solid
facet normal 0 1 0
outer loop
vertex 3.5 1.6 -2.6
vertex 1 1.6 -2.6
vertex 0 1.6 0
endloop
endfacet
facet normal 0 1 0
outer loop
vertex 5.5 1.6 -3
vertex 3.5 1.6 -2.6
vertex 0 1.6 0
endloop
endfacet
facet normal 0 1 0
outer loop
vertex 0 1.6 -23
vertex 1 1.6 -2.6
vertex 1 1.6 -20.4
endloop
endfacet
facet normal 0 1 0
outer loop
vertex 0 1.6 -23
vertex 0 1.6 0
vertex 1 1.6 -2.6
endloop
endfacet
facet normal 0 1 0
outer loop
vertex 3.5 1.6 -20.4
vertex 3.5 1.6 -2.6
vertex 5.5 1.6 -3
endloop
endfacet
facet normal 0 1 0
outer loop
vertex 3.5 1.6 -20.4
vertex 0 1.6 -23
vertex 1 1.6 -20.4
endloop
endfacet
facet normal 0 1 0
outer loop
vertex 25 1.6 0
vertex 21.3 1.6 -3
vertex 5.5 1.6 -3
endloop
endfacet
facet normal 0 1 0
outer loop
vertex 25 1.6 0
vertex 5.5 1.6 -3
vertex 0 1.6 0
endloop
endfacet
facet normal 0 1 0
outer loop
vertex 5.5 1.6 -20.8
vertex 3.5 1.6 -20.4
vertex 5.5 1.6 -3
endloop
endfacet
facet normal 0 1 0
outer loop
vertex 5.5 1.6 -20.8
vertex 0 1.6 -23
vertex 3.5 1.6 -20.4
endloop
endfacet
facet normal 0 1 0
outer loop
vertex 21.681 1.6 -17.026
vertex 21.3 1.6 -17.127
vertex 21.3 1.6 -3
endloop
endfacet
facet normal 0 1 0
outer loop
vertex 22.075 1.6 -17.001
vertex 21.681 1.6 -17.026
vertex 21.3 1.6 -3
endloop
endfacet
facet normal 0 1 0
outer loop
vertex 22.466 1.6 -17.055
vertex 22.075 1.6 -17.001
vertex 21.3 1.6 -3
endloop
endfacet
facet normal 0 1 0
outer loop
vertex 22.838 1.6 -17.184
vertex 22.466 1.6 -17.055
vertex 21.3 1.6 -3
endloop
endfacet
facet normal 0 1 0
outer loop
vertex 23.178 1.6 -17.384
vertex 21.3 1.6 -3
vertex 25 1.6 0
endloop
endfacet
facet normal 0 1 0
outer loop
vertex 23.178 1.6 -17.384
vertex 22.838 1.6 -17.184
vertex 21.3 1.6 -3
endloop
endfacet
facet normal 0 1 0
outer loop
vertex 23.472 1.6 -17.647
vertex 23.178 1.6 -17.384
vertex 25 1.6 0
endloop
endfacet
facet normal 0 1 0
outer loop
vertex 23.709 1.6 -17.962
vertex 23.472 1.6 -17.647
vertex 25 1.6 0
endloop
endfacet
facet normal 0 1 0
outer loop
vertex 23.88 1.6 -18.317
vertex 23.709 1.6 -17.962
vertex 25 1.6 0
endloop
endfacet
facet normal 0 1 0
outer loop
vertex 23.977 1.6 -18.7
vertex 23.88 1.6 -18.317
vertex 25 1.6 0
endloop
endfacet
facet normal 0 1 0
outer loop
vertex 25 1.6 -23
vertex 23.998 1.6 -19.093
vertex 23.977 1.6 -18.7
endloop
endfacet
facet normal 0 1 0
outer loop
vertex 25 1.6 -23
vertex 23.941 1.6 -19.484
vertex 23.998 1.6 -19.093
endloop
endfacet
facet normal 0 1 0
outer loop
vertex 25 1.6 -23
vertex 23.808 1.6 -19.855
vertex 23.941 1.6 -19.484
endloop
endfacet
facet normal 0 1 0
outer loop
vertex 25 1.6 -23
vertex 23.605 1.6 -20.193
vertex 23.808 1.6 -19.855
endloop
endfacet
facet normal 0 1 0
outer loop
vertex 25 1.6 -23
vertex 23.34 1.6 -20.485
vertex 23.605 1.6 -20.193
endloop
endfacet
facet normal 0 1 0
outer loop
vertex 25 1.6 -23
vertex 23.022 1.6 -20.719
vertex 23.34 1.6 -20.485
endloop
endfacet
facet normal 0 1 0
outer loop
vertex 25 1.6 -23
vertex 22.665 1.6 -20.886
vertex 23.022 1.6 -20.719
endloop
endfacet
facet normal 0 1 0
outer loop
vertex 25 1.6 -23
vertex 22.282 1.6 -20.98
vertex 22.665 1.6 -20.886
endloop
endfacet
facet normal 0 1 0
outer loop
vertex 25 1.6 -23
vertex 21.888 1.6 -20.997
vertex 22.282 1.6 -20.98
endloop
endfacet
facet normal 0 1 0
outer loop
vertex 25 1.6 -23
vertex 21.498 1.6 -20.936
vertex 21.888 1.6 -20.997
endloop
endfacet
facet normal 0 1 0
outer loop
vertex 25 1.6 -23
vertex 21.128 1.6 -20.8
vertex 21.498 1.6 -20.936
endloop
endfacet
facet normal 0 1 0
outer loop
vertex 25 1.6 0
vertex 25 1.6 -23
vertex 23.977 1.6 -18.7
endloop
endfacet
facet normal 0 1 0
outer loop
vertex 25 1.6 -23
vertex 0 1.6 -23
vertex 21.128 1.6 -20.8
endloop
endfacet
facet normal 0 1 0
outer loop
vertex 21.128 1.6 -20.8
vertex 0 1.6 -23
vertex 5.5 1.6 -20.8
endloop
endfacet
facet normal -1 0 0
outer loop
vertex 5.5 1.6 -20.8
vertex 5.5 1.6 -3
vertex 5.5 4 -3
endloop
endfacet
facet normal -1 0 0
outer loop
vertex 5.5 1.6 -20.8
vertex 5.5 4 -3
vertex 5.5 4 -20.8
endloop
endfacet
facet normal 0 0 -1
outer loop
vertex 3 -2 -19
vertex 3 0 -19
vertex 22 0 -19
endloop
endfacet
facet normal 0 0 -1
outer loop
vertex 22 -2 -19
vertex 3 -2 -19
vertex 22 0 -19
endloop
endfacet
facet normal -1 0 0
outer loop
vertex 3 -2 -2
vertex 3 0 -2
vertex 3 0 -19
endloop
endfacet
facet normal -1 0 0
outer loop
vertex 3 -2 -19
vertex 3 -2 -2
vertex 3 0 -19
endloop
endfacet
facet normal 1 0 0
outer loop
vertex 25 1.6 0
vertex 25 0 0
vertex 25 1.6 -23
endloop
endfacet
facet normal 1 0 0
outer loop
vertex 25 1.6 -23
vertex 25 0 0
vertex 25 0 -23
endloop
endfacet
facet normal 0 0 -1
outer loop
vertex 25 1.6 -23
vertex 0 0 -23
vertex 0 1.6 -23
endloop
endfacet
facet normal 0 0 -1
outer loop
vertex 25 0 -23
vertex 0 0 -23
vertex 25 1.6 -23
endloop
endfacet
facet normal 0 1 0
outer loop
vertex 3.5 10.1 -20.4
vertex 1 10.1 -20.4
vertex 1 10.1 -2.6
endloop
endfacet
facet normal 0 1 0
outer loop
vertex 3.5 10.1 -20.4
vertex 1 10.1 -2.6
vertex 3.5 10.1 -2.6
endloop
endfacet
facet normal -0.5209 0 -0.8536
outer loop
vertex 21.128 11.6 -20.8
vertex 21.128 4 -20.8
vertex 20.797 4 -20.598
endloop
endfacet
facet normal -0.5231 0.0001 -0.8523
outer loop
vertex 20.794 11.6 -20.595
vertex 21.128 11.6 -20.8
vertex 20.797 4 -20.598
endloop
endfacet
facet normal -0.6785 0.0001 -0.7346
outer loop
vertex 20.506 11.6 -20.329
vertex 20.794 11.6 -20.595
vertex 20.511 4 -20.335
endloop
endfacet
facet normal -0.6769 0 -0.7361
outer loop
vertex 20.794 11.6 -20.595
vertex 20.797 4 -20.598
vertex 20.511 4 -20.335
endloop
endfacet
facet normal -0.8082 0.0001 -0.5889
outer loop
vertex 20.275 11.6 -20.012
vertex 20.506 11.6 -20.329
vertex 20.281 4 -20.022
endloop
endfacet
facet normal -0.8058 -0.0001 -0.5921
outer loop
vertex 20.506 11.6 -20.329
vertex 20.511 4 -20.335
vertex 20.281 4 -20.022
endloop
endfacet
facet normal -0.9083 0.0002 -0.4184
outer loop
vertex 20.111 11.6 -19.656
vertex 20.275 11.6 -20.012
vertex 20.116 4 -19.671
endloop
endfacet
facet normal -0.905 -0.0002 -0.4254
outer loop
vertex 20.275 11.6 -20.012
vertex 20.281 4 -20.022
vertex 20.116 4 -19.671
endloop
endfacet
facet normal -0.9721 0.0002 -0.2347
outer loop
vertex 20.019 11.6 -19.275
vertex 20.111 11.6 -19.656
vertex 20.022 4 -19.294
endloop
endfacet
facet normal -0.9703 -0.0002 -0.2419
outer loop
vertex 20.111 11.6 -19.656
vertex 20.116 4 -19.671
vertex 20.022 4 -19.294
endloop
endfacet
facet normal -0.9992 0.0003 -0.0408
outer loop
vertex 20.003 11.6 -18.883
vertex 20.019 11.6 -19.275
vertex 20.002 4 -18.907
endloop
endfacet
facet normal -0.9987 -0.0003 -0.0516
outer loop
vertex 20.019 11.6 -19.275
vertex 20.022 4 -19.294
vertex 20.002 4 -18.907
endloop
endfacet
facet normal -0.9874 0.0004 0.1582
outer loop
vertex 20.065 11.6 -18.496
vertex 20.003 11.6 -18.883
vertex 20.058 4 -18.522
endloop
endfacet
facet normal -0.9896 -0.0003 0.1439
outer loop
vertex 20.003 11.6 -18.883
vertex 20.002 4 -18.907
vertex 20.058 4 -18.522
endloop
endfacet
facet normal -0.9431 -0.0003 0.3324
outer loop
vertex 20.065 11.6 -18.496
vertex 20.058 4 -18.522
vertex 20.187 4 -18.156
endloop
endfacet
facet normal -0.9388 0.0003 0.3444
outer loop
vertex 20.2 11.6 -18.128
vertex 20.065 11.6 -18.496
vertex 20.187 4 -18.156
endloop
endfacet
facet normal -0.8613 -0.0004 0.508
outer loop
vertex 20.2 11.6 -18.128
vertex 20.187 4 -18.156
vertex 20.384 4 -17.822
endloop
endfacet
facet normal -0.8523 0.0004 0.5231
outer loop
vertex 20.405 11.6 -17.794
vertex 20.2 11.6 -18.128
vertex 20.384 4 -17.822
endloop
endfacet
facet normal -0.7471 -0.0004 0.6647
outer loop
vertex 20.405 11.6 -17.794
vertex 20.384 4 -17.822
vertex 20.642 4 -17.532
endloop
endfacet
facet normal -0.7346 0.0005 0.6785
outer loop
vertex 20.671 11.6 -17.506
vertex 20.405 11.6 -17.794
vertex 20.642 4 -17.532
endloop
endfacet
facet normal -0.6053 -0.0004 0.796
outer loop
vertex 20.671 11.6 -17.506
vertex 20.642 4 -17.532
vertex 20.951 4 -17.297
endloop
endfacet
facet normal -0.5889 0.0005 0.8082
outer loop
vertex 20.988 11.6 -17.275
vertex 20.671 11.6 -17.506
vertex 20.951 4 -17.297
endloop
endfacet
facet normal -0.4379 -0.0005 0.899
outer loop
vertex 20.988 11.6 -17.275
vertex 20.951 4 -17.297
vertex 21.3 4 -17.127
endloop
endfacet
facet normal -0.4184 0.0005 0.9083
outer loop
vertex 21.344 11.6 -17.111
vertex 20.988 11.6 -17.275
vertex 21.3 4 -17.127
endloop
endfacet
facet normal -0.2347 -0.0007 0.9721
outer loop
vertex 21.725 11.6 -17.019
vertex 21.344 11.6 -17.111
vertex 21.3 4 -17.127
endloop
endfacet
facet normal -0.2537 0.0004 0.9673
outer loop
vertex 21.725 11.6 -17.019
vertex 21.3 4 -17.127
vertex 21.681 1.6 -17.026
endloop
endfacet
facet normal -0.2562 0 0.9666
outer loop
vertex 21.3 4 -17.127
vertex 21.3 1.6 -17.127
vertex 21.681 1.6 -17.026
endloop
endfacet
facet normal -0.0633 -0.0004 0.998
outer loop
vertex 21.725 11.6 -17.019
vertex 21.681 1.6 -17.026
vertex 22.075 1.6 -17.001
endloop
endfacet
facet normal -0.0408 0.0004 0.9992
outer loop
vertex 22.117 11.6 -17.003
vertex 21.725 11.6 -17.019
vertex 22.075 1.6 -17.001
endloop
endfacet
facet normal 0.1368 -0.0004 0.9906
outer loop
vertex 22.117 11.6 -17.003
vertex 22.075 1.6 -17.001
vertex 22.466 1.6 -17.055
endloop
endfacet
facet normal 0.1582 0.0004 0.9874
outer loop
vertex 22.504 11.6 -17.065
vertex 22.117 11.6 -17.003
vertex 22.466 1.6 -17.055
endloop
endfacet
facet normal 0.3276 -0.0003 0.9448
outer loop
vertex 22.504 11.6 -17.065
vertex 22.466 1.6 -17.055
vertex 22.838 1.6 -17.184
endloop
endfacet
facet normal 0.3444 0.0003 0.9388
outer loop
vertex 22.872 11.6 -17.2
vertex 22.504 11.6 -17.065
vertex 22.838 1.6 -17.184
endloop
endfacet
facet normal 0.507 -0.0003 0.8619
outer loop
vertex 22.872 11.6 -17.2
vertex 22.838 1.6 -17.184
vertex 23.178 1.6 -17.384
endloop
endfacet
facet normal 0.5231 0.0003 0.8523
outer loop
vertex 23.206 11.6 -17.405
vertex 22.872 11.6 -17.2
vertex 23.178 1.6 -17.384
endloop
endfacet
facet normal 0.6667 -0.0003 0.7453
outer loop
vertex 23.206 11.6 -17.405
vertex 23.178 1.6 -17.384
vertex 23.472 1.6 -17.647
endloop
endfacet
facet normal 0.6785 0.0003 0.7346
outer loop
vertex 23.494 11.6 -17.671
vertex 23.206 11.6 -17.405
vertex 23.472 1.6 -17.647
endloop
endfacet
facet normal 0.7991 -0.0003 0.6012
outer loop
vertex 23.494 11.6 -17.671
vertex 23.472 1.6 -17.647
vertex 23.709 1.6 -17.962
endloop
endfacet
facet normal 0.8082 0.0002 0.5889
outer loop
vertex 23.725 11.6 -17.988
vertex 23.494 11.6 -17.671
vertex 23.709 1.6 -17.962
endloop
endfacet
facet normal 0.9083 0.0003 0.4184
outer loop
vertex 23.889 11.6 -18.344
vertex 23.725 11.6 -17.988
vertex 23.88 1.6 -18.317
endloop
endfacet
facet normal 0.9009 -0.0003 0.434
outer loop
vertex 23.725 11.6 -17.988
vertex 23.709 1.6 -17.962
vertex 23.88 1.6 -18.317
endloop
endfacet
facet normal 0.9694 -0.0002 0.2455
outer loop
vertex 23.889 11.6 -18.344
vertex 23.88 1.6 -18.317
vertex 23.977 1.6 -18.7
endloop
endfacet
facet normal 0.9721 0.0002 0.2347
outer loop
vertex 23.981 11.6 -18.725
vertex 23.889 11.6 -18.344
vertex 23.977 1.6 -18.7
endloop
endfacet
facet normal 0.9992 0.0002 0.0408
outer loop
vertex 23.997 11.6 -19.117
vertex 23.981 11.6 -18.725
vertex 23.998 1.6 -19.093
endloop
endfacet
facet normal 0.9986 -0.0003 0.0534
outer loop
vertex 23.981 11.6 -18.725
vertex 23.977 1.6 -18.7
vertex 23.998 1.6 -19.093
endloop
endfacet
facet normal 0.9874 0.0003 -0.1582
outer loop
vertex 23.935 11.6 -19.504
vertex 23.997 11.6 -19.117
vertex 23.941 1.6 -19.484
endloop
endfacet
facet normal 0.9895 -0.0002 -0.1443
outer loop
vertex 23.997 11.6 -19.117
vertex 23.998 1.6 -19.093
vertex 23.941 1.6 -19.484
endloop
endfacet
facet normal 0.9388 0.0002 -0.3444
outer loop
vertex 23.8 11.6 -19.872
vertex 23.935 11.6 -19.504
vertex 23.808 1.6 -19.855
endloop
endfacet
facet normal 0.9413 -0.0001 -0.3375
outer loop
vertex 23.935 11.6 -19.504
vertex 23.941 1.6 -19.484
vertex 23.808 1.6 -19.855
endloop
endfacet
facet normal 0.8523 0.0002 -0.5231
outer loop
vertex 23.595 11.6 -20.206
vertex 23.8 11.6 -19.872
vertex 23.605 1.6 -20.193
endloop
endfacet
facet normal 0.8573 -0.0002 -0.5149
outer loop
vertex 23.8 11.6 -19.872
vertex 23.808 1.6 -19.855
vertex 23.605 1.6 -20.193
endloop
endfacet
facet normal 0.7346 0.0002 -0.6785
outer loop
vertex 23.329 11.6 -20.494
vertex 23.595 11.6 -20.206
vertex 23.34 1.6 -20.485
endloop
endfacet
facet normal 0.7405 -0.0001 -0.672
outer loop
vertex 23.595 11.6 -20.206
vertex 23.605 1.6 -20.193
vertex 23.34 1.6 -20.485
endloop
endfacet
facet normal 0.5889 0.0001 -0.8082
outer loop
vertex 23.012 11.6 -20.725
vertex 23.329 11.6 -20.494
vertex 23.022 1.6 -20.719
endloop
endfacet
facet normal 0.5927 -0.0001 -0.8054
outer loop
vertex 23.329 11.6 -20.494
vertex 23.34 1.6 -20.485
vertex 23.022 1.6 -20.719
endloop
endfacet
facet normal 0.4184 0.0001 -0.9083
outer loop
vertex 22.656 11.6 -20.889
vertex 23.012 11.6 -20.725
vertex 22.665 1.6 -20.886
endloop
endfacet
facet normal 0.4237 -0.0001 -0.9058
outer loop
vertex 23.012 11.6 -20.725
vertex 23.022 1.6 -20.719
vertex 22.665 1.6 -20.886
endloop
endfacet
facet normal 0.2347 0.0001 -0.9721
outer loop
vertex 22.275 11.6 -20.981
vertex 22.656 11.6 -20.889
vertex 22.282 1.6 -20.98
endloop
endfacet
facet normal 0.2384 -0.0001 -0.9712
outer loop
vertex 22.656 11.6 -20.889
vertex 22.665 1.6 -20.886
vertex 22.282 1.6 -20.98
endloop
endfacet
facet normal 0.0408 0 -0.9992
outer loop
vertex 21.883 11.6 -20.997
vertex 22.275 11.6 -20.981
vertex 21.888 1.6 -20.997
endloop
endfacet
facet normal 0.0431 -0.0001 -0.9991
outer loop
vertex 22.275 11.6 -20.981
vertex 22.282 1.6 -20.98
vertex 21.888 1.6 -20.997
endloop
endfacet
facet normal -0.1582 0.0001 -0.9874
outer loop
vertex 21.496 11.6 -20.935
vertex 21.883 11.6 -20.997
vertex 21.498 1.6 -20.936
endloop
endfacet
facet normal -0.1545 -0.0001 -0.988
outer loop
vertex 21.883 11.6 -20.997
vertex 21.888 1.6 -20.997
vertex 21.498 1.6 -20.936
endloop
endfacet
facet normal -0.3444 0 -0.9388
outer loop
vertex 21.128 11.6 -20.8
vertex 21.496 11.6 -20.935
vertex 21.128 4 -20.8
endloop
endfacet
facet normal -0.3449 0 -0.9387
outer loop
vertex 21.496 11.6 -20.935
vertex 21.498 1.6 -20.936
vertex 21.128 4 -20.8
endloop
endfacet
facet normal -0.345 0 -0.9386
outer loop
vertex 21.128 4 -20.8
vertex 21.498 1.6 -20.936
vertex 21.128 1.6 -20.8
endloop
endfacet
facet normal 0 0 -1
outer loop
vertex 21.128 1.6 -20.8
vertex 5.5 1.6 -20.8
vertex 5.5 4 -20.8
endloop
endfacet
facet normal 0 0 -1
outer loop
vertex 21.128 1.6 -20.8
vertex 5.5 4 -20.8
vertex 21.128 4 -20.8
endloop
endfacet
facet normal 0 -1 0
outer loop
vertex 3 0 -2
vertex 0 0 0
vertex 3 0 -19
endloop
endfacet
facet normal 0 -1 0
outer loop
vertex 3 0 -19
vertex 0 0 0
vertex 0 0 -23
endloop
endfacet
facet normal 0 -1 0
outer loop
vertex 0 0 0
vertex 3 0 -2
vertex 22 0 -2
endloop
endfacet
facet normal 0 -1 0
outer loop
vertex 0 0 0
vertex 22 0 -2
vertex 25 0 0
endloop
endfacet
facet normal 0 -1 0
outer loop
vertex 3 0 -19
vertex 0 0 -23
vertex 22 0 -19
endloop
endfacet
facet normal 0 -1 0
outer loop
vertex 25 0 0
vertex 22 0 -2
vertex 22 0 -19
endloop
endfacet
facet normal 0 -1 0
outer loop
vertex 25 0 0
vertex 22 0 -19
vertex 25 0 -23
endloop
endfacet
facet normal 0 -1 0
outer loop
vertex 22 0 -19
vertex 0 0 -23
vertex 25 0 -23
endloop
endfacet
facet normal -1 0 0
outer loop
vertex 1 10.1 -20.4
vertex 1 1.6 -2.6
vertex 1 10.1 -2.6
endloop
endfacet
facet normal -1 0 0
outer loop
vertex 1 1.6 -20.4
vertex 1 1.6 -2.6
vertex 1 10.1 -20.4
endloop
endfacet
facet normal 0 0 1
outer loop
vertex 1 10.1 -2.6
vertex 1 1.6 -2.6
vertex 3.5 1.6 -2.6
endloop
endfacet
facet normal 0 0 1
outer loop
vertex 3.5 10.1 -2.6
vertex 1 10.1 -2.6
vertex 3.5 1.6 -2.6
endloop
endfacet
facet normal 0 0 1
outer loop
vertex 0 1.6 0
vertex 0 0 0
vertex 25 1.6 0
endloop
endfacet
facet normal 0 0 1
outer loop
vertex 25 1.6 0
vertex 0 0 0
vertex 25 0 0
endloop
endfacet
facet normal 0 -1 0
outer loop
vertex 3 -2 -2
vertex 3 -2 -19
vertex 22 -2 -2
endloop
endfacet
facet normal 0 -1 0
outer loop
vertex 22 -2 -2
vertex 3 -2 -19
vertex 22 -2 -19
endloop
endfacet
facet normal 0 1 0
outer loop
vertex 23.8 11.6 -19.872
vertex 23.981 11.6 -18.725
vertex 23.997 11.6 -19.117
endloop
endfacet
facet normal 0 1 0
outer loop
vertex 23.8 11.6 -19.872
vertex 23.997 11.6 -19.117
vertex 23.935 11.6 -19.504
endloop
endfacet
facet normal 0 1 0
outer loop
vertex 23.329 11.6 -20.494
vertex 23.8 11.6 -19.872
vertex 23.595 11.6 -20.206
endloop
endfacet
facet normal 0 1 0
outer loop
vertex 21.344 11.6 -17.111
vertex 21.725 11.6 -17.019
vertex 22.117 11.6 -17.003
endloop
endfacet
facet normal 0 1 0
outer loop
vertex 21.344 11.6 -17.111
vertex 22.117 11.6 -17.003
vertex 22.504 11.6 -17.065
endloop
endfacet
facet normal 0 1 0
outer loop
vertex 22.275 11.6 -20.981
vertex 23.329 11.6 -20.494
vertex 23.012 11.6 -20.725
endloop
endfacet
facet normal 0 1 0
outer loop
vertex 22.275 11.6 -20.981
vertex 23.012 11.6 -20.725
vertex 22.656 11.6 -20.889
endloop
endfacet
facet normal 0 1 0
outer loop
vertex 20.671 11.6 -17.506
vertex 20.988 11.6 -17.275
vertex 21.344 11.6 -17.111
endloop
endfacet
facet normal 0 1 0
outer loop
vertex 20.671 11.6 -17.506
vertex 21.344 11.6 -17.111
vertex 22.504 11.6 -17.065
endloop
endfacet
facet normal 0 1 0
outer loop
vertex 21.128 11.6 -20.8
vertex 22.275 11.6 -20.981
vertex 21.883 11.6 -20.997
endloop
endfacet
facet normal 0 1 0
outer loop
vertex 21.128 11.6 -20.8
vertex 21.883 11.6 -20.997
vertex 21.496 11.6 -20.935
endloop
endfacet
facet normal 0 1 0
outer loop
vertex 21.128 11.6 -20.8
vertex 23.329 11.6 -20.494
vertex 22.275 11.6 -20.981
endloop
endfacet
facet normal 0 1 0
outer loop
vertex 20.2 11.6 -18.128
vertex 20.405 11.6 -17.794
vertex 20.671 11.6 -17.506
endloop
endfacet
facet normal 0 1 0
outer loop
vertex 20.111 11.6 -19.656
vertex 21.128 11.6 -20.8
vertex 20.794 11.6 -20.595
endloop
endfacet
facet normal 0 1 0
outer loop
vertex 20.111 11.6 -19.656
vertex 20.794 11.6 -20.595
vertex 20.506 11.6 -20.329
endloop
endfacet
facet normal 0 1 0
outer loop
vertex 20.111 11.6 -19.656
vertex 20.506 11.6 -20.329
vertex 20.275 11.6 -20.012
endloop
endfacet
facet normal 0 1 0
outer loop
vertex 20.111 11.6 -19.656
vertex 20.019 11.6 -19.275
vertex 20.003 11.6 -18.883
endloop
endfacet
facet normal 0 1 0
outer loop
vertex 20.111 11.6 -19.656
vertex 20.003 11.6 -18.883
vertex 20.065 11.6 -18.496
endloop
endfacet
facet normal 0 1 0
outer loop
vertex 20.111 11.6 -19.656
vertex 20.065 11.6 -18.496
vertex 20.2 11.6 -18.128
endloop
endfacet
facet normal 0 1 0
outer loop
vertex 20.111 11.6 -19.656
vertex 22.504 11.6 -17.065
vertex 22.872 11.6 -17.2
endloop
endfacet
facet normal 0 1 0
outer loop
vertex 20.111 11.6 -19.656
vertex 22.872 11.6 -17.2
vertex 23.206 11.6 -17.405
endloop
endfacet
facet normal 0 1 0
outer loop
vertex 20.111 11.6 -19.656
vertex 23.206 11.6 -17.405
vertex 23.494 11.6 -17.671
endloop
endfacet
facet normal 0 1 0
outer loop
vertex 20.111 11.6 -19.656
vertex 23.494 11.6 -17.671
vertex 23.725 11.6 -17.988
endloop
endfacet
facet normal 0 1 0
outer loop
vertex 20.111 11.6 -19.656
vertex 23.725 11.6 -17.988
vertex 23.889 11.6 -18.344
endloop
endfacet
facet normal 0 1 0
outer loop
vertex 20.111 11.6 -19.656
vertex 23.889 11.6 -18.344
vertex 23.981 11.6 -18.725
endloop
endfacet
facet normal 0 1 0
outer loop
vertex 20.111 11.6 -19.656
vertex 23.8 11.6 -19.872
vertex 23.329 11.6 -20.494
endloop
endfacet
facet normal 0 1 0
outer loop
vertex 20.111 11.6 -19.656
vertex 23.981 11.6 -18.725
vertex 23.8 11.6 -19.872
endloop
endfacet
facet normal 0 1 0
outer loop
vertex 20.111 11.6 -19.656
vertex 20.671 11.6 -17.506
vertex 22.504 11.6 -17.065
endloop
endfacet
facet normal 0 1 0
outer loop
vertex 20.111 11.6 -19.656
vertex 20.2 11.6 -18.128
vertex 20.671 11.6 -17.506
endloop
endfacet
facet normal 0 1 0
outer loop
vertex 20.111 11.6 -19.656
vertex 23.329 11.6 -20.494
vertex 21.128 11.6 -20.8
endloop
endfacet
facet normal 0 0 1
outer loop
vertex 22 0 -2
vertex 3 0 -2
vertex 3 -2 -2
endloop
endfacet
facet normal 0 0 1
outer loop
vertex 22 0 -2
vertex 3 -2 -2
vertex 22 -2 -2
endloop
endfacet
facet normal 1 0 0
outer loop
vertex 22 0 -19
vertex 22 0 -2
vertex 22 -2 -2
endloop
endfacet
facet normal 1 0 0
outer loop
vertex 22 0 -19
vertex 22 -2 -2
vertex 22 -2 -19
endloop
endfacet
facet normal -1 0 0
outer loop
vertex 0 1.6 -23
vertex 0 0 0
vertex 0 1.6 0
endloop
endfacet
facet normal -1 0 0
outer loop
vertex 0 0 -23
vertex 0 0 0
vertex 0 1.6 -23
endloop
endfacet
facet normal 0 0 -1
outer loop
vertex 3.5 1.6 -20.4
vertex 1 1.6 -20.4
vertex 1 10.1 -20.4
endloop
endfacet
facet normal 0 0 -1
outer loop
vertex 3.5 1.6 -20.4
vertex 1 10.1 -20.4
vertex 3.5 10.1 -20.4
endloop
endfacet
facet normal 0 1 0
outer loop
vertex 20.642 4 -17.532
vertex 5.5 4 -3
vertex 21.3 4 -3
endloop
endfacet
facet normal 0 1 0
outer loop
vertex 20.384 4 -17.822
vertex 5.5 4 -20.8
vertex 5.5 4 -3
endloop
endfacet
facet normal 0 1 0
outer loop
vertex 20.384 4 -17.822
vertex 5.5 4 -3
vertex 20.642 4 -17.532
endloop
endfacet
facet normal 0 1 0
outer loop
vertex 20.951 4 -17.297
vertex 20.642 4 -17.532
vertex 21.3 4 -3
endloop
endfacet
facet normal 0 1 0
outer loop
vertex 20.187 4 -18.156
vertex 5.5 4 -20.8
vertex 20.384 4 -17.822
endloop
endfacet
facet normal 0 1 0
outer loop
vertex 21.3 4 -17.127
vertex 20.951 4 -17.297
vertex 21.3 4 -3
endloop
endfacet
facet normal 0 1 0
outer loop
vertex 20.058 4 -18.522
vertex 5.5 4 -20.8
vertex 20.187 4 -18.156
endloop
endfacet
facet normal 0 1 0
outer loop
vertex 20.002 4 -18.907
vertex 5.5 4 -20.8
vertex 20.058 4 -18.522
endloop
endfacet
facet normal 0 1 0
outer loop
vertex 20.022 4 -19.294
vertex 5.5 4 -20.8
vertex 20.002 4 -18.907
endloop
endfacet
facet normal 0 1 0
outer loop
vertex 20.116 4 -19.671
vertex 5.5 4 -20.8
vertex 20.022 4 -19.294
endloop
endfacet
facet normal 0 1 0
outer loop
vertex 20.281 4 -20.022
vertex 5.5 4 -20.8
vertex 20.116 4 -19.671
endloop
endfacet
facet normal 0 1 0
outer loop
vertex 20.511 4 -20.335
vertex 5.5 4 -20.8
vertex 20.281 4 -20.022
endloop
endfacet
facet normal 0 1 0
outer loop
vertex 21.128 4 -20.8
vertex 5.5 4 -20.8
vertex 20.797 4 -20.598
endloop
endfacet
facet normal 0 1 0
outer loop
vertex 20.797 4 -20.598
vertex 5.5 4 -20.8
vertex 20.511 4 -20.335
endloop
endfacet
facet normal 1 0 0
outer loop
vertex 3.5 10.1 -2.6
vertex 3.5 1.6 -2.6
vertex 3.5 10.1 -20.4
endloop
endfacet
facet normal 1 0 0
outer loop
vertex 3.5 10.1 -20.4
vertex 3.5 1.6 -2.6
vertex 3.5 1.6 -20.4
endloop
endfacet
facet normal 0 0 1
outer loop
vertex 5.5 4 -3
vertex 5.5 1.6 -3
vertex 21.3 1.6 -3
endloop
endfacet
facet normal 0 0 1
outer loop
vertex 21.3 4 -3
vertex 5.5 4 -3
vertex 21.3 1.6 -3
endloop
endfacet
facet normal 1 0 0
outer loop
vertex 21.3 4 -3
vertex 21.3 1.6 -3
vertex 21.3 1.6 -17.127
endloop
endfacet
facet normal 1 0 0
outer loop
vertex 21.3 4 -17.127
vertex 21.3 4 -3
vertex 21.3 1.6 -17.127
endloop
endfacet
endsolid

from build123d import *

# Parameters (mm, degrees)
SKETCH1_W            = 25
SKETCH1_H            = 23
PCB_DEPTH            = 1.6
SIM800L_MODULE_START = 1.6
SKETCH2_W            = 15.8
SKETCH2_H            = 17.8
SIM800L_MODULE_DEPTH = 2.4
HEADER_7PIN_START    = 1.6
SKETCH3_W            = 2.5
SKETCH3_H            = 17.8
HEADER_7PIN_DEPTH    = 8.5
ANTENNA_SPRING_START = 1.6
SKETCH4_R            = 2
ANTENNA_SPRING_DEPTH = 10
SKETCH5_W            = 19
SKETCH5_H            = 17
SIM_HOLDER_DEPTH     = 2


with BuildPart() as part:
    # Sketch1 → PCB (new body)
    with BuildSketch(Plane(origin=(0, 0, 0), x_dir=(1, 0, 0), z_dir=(0, 1, 0))):
        with Locations((12.5, 11.5)):
            Rectangle(SKETCH1_W, SKETCH1_H)
    extrude(amount=PCB_DEPTH)

    # Sketch2 → SIM800L_module (add)
    with BuildSketch(Plane(origin=(0, 0, 0), x_dir=(1, 0, 0), z_dir=(0, 1, 0)).offset(SIM800L_MODULE_START)):
        with Locations((13.4, 11.9)):
            Rectangle(SKETCH2_W, SKETCH2_H)
    extrude(amount=SIM800L_MODULE_DEPTH)

    # Sketch3 → Header_7pin (add)
    with BuildSketch(Plane(origin=(0, 0, 0), x_dir=(1, 0, 0), z_dir=(0, 1, 0)).offset(HEADER_7PIN_START)):
        with Locations((2.25, 11.5)):
            Rectangle(SKETCH3_W, SKETCH3_H)
    extrude(amount=HEADER_7PIN_DEPTH)

    # Sketch4 → Antenna_spring (add)
    with BuildSketch(Plane(origin=(0, 0, 0), x_dir=(1, 0, 0), z_dir=(0, 1, 0)).offset(ANTENNA_SPRING_START)):
        with Locations(Location((22, 19, 0), (0, 0, 115.841932763))):
            Circle(SKETCH4_R)
    extrude(amount=ANTENNA_SPRING_DEPTH)

    # Sketch5 → SIM_holder (add)
    with BuildSketch(Plane(origin=(0, 0, 0), x_dir=(1, 0, 0), z_dir=(0, 1, 0))):
        with Locations((12.5, 10.5)):
            Rectangle(SKETCH5_W, SKETCH5_H)
    extrude(amount=-SIM_HOLDER_DEPTH)


solid = part.part
